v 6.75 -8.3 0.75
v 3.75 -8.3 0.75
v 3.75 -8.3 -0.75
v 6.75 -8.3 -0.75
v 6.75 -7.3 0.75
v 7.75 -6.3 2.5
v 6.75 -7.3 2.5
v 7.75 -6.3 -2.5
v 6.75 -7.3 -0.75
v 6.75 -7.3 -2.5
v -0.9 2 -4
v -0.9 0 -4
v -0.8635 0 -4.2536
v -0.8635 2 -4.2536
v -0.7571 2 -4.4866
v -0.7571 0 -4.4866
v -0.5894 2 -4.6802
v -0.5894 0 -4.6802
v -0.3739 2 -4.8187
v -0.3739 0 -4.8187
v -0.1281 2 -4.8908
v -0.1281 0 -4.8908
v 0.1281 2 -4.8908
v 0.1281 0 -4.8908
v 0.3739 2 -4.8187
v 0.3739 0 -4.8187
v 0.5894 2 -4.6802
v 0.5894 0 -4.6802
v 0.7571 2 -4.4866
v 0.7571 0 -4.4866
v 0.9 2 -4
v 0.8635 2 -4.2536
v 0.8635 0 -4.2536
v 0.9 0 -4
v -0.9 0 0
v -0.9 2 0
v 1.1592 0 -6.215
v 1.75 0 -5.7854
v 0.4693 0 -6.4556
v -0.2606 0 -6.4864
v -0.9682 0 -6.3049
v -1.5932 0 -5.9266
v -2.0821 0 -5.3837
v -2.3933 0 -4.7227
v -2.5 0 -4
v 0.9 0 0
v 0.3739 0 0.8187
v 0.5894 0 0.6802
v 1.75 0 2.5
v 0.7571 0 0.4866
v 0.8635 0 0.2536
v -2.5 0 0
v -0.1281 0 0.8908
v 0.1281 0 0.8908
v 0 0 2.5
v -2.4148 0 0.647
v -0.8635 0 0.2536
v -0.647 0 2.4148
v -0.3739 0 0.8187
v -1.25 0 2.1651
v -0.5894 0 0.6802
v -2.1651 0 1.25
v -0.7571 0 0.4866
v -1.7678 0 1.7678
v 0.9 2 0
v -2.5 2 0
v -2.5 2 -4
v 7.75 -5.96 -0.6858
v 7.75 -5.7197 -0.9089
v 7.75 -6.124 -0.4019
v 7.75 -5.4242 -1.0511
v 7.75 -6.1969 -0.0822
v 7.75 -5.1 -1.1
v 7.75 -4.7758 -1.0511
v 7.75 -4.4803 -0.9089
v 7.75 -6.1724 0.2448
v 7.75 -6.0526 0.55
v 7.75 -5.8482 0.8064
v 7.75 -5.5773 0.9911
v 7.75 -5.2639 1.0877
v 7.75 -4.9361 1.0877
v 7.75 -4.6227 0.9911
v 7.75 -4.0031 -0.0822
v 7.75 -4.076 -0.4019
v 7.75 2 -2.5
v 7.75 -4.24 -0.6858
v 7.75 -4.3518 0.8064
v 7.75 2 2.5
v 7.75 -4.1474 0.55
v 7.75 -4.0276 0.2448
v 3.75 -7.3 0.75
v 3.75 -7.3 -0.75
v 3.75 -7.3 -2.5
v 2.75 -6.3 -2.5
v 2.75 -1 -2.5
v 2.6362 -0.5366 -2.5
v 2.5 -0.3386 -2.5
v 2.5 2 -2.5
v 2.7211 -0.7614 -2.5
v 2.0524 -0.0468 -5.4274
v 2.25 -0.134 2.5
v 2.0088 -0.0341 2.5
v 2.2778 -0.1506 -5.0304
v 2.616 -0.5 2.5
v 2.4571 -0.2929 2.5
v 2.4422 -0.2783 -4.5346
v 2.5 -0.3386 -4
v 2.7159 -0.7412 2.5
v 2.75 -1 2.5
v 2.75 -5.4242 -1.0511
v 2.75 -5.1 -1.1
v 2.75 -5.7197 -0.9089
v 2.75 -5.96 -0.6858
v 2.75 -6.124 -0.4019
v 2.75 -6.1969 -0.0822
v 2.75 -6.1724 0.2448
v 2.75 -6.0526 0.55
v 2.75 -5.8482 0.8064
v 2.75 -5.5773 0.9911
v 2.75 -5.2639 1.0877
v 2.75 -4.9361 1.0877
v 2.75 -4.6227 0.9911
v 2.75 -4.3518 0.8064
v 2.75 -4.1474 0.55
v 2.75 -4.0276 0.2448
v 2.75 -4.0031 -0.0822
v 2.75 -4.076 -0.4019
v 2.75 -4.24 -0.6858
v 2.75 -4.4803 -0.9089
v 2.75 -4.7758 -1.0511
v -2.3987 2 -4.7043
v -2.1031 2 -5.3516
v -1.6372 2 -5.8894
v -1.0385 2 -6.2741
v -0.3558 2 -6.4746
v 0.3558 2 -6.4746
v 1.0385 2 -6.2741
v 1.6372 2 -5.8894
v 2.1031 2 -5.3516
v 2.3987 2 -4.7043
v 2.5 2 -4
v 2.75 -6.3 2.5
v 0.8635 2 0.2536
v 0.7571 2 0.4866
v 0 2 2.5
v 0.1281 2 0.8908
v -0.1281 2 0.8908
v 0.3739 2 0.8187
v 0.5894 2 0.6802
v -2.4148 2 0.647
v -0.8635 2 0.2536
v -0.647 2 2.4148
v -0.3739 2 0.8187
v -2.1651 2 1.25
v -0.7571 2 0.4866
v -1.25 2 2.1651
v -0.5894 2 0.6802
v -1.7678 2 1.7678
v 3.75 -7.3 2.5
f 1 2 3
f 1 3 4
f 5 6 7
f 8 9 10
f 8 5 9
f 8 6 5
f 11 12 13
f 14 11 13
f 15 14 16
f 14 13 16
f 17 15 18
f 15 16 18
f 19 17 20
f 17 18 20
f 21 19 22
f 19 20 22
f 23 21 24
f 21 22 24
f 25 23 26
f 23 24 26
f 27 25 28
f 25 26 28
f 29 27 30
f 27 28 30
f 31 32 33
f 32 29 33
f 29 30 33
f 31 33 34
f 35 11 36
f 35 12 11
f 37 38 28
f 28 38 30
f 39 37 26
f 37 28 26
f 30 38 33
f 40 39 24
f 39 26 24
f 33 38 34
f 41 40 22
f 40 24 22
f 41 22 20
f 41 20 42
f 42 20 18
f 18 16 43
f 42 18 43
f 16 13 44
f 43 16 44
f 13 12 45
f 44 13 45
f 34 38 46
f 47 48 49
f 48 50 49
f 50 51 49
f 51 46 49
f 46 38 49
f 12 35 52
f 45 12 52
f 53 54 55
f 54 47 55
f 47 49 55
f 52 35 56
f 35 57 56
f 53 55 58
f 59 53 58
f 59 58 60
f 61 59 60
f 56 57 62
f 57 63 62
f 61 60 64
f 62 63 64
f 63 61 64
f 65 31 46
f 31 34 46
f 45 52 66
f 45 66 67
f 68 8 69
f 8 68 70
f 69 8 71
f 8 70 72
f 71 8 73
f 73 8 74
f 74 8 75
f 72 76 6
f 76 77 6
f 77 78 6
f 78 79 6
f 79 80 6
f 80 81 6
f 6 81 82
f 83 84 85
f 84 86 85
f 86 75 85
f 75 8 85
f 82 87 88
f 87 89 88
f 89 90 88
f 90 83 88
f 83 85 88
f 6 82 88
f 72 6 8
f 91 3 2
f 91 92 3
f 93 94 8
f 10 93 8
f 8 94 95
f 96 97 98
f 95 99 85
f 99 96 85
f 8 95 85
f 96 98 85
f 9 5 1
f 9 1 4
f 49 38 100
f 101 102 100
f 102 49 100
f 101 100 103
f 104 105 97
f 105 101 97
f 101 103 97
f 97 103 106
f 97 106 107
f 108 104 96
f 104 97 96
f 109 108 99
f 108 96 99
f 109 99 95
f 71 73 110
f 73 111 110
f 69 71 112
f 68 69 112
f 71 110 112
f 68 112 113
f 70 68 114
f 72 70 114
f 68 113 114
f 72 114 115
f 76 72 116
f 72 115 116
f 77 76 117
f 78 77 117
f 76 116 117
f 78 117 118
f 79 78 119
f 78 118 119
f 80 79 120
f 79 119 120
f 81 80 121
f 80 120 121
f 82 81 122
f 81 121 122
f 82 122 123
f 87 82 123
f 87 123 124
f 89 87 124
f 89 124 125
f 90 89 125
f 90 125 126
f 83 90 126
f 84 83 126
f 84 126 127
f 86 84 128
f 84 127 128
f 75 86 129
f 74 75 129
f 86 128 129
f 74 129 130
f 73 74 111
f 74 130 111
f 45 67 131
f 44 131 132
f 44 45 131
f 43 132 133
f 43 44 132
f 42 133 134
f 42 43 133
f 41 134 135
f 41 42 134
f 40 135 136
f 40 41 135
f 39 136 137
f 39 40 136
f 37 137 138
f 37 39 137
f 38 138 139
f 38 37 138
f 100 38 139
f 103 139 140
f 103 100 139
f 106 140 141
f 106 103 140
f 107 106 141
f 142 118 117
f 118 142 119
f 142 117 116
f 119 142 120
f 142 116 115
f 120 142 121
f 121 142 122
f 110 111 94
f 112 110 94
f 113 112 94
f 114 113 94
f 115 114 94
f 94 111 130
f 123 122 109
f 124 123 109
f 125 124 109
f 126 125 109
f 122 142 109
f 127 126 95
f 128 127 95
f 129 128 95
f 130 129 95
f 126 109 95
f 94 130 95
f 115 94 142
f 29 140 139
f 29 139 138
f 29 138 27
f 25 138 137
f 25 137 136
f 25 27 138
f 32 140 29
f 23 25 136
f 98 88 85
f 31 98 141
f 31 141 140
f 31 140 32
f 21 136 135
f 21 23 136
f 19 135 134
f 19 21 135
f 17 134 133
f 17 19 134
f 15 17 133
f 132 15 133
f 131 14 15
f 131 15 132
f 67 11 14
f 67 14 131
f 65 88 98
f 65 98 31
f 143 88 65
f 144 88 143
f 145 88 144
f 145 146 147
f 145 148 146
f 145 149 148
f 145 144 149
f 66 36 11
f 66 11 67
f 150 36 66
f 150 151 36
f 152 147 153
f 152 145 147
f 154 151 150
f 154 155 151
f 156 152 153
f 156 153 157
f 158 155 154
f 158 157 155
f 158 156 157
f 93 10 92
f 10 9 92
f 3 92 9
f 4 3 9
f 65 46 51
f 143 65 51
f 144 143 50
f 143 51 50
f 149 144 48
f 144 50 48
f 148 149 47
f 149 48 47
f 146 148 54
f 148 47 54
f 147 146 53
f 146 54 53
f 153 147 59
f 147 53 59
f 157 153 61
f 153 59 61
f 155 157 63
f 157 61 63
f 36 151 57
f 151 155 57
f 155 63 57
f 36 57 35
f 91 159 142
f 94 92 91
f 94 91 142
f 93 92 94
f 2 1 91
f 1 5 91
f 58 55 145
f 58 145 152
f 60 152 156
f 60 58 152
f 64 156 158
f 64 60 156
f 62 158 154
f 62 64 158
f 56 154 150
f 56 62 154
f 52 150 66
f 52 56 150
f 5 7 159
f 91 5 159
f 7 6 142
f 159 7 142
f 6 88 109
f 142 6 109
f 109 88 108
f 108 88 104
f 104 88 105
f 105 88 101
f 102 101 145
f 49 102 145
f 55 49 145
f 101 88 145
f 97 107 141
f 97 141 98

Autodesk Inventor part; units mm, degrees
ref_plane "YZ Plane" through (0, 0, 0) normal (1, 0, 0) x (0, 1, 0)
ref_plane "XZ Plane" through (0, 0, 0) normal (0, 1, 0) x (-1, 0, 0)
sketch "スケッチ1" plane through (0, 0, 0) normal (0, 1, 0) x (-1, 0, 0)
  arc A0 (0.9, 0) -> (-0.9, 0) centre (0, 0) ccw
  arc A1 (-0.9, -4) -> (0.9, -4) centre (0, -4) ccw
  line L0 (0, 0) -> (0, -4) construction
  line L1 (-0.9, -4) -> (-0.9, 0)
  line L2 (0.9, -4) -> (0.9, 0)
  arc A2 (-2.5, -4) -> (2.5, -4) centre (0, -4) ccw
  line L3 (-2.5, -4) -> (-2.5, 0)
  arc A3 (2.5, 0) -> (-2.5, 0) centre (0, 0) ccw
  line L4 (2.5, 0) -> (2.5, -4)
  line L5 (-2.5, -2.5) -> (-7.75, -2.5)
  line L6 (-7.75, -2.5) -> (-7.75, 2.5)
  line L7 (-7.75, 2.5) -> (-2.75, 2.5)
  line L8 (-2.75, -2.5) -> (-7.75, -2.5)
  line L9 (-7.75, -2.5) -> (-7.75, 2.5)
  line L10 (-7.75, 2.5) -> (-2.75, 2.5)
  line L11 (-2.75, 2.5) -> (-2.75, -2.5)
  line L12 (-2.75, 2.5) -> (0, 2.5)
  point P0 (-5.25, -2.5)
  point P1 (-3.4, 2.5)
  point P2 (0, 2.5)
  dimension "d0" = 1.8
  dimension "d1" = 4
  dimension "d2" = 1.6
  dimension "d40" = 5
  dimension "d41" = 5.25
  dimension "d42" = 5
extrude "押し出し1" add sketch "スケッチ1" along normal blind 2
extrude "押し出し4" add sketch "スケッチ1" against normal blind 7.3 contours L5 L6 L7 L11
sketch "スケッチ6" plane through (7.75, 2, 2.5) normal (1, 0, 0) x (0, 0, -1)
  line L0 (5, -9.3) -> (0, -9.3) projected
  point P0 (2.5, -2)
  point P1 (2.5, -7.1)
  point P2 (2.5, -9.3)
  dimension "d43" = 2.2
hole "穴3" at (7.75, -5.1, 0) direction (-1, 0, 0) diameter 2.2 end through all
fillet "フィレット3" radius 1 1 edges at (2.75, 0, 0)
ref_plane "作業平面2" through (0, 0, 0) normal (1, 0, 0) x (0, 0, -1)
chamfer "面取り1" distance 1 angle 45 2 edges at (2.75, -7.3, 0) (7.75, -7.3, 0)
sketch "スケッチ7" plane through (0, -7.3, 0) normal (0, -1, 0) x (1, 0, 0)
  line L0 (6.75, 2.5) -> (6.75, -2.5) projected
  line L1 (3.75, -2.5) -> (3.75, 2.5) projected
  line L2 (6.75, 0.75) -> (3.75, 0.75)
  line L3 (3.75, 0.75) -> (3.75, -0.75)
  line L4 (3.75, -0.75) -> (6.75, -0.75)
  line L5 (6.75, -0.75) -> (6.75, 0.75)
  point P0 (0, 0)
  point P1 (6.75, 0)
  point P2 (6.75, 0.75)
  point P3 (3.75, 0.75)
  dimension "d55" = 1.5
extrude "押し出し5" add sketch "スケッチ7" along normal blind 1
properties part number "om_Drop_10g_L" material "ABS プラスチック"
